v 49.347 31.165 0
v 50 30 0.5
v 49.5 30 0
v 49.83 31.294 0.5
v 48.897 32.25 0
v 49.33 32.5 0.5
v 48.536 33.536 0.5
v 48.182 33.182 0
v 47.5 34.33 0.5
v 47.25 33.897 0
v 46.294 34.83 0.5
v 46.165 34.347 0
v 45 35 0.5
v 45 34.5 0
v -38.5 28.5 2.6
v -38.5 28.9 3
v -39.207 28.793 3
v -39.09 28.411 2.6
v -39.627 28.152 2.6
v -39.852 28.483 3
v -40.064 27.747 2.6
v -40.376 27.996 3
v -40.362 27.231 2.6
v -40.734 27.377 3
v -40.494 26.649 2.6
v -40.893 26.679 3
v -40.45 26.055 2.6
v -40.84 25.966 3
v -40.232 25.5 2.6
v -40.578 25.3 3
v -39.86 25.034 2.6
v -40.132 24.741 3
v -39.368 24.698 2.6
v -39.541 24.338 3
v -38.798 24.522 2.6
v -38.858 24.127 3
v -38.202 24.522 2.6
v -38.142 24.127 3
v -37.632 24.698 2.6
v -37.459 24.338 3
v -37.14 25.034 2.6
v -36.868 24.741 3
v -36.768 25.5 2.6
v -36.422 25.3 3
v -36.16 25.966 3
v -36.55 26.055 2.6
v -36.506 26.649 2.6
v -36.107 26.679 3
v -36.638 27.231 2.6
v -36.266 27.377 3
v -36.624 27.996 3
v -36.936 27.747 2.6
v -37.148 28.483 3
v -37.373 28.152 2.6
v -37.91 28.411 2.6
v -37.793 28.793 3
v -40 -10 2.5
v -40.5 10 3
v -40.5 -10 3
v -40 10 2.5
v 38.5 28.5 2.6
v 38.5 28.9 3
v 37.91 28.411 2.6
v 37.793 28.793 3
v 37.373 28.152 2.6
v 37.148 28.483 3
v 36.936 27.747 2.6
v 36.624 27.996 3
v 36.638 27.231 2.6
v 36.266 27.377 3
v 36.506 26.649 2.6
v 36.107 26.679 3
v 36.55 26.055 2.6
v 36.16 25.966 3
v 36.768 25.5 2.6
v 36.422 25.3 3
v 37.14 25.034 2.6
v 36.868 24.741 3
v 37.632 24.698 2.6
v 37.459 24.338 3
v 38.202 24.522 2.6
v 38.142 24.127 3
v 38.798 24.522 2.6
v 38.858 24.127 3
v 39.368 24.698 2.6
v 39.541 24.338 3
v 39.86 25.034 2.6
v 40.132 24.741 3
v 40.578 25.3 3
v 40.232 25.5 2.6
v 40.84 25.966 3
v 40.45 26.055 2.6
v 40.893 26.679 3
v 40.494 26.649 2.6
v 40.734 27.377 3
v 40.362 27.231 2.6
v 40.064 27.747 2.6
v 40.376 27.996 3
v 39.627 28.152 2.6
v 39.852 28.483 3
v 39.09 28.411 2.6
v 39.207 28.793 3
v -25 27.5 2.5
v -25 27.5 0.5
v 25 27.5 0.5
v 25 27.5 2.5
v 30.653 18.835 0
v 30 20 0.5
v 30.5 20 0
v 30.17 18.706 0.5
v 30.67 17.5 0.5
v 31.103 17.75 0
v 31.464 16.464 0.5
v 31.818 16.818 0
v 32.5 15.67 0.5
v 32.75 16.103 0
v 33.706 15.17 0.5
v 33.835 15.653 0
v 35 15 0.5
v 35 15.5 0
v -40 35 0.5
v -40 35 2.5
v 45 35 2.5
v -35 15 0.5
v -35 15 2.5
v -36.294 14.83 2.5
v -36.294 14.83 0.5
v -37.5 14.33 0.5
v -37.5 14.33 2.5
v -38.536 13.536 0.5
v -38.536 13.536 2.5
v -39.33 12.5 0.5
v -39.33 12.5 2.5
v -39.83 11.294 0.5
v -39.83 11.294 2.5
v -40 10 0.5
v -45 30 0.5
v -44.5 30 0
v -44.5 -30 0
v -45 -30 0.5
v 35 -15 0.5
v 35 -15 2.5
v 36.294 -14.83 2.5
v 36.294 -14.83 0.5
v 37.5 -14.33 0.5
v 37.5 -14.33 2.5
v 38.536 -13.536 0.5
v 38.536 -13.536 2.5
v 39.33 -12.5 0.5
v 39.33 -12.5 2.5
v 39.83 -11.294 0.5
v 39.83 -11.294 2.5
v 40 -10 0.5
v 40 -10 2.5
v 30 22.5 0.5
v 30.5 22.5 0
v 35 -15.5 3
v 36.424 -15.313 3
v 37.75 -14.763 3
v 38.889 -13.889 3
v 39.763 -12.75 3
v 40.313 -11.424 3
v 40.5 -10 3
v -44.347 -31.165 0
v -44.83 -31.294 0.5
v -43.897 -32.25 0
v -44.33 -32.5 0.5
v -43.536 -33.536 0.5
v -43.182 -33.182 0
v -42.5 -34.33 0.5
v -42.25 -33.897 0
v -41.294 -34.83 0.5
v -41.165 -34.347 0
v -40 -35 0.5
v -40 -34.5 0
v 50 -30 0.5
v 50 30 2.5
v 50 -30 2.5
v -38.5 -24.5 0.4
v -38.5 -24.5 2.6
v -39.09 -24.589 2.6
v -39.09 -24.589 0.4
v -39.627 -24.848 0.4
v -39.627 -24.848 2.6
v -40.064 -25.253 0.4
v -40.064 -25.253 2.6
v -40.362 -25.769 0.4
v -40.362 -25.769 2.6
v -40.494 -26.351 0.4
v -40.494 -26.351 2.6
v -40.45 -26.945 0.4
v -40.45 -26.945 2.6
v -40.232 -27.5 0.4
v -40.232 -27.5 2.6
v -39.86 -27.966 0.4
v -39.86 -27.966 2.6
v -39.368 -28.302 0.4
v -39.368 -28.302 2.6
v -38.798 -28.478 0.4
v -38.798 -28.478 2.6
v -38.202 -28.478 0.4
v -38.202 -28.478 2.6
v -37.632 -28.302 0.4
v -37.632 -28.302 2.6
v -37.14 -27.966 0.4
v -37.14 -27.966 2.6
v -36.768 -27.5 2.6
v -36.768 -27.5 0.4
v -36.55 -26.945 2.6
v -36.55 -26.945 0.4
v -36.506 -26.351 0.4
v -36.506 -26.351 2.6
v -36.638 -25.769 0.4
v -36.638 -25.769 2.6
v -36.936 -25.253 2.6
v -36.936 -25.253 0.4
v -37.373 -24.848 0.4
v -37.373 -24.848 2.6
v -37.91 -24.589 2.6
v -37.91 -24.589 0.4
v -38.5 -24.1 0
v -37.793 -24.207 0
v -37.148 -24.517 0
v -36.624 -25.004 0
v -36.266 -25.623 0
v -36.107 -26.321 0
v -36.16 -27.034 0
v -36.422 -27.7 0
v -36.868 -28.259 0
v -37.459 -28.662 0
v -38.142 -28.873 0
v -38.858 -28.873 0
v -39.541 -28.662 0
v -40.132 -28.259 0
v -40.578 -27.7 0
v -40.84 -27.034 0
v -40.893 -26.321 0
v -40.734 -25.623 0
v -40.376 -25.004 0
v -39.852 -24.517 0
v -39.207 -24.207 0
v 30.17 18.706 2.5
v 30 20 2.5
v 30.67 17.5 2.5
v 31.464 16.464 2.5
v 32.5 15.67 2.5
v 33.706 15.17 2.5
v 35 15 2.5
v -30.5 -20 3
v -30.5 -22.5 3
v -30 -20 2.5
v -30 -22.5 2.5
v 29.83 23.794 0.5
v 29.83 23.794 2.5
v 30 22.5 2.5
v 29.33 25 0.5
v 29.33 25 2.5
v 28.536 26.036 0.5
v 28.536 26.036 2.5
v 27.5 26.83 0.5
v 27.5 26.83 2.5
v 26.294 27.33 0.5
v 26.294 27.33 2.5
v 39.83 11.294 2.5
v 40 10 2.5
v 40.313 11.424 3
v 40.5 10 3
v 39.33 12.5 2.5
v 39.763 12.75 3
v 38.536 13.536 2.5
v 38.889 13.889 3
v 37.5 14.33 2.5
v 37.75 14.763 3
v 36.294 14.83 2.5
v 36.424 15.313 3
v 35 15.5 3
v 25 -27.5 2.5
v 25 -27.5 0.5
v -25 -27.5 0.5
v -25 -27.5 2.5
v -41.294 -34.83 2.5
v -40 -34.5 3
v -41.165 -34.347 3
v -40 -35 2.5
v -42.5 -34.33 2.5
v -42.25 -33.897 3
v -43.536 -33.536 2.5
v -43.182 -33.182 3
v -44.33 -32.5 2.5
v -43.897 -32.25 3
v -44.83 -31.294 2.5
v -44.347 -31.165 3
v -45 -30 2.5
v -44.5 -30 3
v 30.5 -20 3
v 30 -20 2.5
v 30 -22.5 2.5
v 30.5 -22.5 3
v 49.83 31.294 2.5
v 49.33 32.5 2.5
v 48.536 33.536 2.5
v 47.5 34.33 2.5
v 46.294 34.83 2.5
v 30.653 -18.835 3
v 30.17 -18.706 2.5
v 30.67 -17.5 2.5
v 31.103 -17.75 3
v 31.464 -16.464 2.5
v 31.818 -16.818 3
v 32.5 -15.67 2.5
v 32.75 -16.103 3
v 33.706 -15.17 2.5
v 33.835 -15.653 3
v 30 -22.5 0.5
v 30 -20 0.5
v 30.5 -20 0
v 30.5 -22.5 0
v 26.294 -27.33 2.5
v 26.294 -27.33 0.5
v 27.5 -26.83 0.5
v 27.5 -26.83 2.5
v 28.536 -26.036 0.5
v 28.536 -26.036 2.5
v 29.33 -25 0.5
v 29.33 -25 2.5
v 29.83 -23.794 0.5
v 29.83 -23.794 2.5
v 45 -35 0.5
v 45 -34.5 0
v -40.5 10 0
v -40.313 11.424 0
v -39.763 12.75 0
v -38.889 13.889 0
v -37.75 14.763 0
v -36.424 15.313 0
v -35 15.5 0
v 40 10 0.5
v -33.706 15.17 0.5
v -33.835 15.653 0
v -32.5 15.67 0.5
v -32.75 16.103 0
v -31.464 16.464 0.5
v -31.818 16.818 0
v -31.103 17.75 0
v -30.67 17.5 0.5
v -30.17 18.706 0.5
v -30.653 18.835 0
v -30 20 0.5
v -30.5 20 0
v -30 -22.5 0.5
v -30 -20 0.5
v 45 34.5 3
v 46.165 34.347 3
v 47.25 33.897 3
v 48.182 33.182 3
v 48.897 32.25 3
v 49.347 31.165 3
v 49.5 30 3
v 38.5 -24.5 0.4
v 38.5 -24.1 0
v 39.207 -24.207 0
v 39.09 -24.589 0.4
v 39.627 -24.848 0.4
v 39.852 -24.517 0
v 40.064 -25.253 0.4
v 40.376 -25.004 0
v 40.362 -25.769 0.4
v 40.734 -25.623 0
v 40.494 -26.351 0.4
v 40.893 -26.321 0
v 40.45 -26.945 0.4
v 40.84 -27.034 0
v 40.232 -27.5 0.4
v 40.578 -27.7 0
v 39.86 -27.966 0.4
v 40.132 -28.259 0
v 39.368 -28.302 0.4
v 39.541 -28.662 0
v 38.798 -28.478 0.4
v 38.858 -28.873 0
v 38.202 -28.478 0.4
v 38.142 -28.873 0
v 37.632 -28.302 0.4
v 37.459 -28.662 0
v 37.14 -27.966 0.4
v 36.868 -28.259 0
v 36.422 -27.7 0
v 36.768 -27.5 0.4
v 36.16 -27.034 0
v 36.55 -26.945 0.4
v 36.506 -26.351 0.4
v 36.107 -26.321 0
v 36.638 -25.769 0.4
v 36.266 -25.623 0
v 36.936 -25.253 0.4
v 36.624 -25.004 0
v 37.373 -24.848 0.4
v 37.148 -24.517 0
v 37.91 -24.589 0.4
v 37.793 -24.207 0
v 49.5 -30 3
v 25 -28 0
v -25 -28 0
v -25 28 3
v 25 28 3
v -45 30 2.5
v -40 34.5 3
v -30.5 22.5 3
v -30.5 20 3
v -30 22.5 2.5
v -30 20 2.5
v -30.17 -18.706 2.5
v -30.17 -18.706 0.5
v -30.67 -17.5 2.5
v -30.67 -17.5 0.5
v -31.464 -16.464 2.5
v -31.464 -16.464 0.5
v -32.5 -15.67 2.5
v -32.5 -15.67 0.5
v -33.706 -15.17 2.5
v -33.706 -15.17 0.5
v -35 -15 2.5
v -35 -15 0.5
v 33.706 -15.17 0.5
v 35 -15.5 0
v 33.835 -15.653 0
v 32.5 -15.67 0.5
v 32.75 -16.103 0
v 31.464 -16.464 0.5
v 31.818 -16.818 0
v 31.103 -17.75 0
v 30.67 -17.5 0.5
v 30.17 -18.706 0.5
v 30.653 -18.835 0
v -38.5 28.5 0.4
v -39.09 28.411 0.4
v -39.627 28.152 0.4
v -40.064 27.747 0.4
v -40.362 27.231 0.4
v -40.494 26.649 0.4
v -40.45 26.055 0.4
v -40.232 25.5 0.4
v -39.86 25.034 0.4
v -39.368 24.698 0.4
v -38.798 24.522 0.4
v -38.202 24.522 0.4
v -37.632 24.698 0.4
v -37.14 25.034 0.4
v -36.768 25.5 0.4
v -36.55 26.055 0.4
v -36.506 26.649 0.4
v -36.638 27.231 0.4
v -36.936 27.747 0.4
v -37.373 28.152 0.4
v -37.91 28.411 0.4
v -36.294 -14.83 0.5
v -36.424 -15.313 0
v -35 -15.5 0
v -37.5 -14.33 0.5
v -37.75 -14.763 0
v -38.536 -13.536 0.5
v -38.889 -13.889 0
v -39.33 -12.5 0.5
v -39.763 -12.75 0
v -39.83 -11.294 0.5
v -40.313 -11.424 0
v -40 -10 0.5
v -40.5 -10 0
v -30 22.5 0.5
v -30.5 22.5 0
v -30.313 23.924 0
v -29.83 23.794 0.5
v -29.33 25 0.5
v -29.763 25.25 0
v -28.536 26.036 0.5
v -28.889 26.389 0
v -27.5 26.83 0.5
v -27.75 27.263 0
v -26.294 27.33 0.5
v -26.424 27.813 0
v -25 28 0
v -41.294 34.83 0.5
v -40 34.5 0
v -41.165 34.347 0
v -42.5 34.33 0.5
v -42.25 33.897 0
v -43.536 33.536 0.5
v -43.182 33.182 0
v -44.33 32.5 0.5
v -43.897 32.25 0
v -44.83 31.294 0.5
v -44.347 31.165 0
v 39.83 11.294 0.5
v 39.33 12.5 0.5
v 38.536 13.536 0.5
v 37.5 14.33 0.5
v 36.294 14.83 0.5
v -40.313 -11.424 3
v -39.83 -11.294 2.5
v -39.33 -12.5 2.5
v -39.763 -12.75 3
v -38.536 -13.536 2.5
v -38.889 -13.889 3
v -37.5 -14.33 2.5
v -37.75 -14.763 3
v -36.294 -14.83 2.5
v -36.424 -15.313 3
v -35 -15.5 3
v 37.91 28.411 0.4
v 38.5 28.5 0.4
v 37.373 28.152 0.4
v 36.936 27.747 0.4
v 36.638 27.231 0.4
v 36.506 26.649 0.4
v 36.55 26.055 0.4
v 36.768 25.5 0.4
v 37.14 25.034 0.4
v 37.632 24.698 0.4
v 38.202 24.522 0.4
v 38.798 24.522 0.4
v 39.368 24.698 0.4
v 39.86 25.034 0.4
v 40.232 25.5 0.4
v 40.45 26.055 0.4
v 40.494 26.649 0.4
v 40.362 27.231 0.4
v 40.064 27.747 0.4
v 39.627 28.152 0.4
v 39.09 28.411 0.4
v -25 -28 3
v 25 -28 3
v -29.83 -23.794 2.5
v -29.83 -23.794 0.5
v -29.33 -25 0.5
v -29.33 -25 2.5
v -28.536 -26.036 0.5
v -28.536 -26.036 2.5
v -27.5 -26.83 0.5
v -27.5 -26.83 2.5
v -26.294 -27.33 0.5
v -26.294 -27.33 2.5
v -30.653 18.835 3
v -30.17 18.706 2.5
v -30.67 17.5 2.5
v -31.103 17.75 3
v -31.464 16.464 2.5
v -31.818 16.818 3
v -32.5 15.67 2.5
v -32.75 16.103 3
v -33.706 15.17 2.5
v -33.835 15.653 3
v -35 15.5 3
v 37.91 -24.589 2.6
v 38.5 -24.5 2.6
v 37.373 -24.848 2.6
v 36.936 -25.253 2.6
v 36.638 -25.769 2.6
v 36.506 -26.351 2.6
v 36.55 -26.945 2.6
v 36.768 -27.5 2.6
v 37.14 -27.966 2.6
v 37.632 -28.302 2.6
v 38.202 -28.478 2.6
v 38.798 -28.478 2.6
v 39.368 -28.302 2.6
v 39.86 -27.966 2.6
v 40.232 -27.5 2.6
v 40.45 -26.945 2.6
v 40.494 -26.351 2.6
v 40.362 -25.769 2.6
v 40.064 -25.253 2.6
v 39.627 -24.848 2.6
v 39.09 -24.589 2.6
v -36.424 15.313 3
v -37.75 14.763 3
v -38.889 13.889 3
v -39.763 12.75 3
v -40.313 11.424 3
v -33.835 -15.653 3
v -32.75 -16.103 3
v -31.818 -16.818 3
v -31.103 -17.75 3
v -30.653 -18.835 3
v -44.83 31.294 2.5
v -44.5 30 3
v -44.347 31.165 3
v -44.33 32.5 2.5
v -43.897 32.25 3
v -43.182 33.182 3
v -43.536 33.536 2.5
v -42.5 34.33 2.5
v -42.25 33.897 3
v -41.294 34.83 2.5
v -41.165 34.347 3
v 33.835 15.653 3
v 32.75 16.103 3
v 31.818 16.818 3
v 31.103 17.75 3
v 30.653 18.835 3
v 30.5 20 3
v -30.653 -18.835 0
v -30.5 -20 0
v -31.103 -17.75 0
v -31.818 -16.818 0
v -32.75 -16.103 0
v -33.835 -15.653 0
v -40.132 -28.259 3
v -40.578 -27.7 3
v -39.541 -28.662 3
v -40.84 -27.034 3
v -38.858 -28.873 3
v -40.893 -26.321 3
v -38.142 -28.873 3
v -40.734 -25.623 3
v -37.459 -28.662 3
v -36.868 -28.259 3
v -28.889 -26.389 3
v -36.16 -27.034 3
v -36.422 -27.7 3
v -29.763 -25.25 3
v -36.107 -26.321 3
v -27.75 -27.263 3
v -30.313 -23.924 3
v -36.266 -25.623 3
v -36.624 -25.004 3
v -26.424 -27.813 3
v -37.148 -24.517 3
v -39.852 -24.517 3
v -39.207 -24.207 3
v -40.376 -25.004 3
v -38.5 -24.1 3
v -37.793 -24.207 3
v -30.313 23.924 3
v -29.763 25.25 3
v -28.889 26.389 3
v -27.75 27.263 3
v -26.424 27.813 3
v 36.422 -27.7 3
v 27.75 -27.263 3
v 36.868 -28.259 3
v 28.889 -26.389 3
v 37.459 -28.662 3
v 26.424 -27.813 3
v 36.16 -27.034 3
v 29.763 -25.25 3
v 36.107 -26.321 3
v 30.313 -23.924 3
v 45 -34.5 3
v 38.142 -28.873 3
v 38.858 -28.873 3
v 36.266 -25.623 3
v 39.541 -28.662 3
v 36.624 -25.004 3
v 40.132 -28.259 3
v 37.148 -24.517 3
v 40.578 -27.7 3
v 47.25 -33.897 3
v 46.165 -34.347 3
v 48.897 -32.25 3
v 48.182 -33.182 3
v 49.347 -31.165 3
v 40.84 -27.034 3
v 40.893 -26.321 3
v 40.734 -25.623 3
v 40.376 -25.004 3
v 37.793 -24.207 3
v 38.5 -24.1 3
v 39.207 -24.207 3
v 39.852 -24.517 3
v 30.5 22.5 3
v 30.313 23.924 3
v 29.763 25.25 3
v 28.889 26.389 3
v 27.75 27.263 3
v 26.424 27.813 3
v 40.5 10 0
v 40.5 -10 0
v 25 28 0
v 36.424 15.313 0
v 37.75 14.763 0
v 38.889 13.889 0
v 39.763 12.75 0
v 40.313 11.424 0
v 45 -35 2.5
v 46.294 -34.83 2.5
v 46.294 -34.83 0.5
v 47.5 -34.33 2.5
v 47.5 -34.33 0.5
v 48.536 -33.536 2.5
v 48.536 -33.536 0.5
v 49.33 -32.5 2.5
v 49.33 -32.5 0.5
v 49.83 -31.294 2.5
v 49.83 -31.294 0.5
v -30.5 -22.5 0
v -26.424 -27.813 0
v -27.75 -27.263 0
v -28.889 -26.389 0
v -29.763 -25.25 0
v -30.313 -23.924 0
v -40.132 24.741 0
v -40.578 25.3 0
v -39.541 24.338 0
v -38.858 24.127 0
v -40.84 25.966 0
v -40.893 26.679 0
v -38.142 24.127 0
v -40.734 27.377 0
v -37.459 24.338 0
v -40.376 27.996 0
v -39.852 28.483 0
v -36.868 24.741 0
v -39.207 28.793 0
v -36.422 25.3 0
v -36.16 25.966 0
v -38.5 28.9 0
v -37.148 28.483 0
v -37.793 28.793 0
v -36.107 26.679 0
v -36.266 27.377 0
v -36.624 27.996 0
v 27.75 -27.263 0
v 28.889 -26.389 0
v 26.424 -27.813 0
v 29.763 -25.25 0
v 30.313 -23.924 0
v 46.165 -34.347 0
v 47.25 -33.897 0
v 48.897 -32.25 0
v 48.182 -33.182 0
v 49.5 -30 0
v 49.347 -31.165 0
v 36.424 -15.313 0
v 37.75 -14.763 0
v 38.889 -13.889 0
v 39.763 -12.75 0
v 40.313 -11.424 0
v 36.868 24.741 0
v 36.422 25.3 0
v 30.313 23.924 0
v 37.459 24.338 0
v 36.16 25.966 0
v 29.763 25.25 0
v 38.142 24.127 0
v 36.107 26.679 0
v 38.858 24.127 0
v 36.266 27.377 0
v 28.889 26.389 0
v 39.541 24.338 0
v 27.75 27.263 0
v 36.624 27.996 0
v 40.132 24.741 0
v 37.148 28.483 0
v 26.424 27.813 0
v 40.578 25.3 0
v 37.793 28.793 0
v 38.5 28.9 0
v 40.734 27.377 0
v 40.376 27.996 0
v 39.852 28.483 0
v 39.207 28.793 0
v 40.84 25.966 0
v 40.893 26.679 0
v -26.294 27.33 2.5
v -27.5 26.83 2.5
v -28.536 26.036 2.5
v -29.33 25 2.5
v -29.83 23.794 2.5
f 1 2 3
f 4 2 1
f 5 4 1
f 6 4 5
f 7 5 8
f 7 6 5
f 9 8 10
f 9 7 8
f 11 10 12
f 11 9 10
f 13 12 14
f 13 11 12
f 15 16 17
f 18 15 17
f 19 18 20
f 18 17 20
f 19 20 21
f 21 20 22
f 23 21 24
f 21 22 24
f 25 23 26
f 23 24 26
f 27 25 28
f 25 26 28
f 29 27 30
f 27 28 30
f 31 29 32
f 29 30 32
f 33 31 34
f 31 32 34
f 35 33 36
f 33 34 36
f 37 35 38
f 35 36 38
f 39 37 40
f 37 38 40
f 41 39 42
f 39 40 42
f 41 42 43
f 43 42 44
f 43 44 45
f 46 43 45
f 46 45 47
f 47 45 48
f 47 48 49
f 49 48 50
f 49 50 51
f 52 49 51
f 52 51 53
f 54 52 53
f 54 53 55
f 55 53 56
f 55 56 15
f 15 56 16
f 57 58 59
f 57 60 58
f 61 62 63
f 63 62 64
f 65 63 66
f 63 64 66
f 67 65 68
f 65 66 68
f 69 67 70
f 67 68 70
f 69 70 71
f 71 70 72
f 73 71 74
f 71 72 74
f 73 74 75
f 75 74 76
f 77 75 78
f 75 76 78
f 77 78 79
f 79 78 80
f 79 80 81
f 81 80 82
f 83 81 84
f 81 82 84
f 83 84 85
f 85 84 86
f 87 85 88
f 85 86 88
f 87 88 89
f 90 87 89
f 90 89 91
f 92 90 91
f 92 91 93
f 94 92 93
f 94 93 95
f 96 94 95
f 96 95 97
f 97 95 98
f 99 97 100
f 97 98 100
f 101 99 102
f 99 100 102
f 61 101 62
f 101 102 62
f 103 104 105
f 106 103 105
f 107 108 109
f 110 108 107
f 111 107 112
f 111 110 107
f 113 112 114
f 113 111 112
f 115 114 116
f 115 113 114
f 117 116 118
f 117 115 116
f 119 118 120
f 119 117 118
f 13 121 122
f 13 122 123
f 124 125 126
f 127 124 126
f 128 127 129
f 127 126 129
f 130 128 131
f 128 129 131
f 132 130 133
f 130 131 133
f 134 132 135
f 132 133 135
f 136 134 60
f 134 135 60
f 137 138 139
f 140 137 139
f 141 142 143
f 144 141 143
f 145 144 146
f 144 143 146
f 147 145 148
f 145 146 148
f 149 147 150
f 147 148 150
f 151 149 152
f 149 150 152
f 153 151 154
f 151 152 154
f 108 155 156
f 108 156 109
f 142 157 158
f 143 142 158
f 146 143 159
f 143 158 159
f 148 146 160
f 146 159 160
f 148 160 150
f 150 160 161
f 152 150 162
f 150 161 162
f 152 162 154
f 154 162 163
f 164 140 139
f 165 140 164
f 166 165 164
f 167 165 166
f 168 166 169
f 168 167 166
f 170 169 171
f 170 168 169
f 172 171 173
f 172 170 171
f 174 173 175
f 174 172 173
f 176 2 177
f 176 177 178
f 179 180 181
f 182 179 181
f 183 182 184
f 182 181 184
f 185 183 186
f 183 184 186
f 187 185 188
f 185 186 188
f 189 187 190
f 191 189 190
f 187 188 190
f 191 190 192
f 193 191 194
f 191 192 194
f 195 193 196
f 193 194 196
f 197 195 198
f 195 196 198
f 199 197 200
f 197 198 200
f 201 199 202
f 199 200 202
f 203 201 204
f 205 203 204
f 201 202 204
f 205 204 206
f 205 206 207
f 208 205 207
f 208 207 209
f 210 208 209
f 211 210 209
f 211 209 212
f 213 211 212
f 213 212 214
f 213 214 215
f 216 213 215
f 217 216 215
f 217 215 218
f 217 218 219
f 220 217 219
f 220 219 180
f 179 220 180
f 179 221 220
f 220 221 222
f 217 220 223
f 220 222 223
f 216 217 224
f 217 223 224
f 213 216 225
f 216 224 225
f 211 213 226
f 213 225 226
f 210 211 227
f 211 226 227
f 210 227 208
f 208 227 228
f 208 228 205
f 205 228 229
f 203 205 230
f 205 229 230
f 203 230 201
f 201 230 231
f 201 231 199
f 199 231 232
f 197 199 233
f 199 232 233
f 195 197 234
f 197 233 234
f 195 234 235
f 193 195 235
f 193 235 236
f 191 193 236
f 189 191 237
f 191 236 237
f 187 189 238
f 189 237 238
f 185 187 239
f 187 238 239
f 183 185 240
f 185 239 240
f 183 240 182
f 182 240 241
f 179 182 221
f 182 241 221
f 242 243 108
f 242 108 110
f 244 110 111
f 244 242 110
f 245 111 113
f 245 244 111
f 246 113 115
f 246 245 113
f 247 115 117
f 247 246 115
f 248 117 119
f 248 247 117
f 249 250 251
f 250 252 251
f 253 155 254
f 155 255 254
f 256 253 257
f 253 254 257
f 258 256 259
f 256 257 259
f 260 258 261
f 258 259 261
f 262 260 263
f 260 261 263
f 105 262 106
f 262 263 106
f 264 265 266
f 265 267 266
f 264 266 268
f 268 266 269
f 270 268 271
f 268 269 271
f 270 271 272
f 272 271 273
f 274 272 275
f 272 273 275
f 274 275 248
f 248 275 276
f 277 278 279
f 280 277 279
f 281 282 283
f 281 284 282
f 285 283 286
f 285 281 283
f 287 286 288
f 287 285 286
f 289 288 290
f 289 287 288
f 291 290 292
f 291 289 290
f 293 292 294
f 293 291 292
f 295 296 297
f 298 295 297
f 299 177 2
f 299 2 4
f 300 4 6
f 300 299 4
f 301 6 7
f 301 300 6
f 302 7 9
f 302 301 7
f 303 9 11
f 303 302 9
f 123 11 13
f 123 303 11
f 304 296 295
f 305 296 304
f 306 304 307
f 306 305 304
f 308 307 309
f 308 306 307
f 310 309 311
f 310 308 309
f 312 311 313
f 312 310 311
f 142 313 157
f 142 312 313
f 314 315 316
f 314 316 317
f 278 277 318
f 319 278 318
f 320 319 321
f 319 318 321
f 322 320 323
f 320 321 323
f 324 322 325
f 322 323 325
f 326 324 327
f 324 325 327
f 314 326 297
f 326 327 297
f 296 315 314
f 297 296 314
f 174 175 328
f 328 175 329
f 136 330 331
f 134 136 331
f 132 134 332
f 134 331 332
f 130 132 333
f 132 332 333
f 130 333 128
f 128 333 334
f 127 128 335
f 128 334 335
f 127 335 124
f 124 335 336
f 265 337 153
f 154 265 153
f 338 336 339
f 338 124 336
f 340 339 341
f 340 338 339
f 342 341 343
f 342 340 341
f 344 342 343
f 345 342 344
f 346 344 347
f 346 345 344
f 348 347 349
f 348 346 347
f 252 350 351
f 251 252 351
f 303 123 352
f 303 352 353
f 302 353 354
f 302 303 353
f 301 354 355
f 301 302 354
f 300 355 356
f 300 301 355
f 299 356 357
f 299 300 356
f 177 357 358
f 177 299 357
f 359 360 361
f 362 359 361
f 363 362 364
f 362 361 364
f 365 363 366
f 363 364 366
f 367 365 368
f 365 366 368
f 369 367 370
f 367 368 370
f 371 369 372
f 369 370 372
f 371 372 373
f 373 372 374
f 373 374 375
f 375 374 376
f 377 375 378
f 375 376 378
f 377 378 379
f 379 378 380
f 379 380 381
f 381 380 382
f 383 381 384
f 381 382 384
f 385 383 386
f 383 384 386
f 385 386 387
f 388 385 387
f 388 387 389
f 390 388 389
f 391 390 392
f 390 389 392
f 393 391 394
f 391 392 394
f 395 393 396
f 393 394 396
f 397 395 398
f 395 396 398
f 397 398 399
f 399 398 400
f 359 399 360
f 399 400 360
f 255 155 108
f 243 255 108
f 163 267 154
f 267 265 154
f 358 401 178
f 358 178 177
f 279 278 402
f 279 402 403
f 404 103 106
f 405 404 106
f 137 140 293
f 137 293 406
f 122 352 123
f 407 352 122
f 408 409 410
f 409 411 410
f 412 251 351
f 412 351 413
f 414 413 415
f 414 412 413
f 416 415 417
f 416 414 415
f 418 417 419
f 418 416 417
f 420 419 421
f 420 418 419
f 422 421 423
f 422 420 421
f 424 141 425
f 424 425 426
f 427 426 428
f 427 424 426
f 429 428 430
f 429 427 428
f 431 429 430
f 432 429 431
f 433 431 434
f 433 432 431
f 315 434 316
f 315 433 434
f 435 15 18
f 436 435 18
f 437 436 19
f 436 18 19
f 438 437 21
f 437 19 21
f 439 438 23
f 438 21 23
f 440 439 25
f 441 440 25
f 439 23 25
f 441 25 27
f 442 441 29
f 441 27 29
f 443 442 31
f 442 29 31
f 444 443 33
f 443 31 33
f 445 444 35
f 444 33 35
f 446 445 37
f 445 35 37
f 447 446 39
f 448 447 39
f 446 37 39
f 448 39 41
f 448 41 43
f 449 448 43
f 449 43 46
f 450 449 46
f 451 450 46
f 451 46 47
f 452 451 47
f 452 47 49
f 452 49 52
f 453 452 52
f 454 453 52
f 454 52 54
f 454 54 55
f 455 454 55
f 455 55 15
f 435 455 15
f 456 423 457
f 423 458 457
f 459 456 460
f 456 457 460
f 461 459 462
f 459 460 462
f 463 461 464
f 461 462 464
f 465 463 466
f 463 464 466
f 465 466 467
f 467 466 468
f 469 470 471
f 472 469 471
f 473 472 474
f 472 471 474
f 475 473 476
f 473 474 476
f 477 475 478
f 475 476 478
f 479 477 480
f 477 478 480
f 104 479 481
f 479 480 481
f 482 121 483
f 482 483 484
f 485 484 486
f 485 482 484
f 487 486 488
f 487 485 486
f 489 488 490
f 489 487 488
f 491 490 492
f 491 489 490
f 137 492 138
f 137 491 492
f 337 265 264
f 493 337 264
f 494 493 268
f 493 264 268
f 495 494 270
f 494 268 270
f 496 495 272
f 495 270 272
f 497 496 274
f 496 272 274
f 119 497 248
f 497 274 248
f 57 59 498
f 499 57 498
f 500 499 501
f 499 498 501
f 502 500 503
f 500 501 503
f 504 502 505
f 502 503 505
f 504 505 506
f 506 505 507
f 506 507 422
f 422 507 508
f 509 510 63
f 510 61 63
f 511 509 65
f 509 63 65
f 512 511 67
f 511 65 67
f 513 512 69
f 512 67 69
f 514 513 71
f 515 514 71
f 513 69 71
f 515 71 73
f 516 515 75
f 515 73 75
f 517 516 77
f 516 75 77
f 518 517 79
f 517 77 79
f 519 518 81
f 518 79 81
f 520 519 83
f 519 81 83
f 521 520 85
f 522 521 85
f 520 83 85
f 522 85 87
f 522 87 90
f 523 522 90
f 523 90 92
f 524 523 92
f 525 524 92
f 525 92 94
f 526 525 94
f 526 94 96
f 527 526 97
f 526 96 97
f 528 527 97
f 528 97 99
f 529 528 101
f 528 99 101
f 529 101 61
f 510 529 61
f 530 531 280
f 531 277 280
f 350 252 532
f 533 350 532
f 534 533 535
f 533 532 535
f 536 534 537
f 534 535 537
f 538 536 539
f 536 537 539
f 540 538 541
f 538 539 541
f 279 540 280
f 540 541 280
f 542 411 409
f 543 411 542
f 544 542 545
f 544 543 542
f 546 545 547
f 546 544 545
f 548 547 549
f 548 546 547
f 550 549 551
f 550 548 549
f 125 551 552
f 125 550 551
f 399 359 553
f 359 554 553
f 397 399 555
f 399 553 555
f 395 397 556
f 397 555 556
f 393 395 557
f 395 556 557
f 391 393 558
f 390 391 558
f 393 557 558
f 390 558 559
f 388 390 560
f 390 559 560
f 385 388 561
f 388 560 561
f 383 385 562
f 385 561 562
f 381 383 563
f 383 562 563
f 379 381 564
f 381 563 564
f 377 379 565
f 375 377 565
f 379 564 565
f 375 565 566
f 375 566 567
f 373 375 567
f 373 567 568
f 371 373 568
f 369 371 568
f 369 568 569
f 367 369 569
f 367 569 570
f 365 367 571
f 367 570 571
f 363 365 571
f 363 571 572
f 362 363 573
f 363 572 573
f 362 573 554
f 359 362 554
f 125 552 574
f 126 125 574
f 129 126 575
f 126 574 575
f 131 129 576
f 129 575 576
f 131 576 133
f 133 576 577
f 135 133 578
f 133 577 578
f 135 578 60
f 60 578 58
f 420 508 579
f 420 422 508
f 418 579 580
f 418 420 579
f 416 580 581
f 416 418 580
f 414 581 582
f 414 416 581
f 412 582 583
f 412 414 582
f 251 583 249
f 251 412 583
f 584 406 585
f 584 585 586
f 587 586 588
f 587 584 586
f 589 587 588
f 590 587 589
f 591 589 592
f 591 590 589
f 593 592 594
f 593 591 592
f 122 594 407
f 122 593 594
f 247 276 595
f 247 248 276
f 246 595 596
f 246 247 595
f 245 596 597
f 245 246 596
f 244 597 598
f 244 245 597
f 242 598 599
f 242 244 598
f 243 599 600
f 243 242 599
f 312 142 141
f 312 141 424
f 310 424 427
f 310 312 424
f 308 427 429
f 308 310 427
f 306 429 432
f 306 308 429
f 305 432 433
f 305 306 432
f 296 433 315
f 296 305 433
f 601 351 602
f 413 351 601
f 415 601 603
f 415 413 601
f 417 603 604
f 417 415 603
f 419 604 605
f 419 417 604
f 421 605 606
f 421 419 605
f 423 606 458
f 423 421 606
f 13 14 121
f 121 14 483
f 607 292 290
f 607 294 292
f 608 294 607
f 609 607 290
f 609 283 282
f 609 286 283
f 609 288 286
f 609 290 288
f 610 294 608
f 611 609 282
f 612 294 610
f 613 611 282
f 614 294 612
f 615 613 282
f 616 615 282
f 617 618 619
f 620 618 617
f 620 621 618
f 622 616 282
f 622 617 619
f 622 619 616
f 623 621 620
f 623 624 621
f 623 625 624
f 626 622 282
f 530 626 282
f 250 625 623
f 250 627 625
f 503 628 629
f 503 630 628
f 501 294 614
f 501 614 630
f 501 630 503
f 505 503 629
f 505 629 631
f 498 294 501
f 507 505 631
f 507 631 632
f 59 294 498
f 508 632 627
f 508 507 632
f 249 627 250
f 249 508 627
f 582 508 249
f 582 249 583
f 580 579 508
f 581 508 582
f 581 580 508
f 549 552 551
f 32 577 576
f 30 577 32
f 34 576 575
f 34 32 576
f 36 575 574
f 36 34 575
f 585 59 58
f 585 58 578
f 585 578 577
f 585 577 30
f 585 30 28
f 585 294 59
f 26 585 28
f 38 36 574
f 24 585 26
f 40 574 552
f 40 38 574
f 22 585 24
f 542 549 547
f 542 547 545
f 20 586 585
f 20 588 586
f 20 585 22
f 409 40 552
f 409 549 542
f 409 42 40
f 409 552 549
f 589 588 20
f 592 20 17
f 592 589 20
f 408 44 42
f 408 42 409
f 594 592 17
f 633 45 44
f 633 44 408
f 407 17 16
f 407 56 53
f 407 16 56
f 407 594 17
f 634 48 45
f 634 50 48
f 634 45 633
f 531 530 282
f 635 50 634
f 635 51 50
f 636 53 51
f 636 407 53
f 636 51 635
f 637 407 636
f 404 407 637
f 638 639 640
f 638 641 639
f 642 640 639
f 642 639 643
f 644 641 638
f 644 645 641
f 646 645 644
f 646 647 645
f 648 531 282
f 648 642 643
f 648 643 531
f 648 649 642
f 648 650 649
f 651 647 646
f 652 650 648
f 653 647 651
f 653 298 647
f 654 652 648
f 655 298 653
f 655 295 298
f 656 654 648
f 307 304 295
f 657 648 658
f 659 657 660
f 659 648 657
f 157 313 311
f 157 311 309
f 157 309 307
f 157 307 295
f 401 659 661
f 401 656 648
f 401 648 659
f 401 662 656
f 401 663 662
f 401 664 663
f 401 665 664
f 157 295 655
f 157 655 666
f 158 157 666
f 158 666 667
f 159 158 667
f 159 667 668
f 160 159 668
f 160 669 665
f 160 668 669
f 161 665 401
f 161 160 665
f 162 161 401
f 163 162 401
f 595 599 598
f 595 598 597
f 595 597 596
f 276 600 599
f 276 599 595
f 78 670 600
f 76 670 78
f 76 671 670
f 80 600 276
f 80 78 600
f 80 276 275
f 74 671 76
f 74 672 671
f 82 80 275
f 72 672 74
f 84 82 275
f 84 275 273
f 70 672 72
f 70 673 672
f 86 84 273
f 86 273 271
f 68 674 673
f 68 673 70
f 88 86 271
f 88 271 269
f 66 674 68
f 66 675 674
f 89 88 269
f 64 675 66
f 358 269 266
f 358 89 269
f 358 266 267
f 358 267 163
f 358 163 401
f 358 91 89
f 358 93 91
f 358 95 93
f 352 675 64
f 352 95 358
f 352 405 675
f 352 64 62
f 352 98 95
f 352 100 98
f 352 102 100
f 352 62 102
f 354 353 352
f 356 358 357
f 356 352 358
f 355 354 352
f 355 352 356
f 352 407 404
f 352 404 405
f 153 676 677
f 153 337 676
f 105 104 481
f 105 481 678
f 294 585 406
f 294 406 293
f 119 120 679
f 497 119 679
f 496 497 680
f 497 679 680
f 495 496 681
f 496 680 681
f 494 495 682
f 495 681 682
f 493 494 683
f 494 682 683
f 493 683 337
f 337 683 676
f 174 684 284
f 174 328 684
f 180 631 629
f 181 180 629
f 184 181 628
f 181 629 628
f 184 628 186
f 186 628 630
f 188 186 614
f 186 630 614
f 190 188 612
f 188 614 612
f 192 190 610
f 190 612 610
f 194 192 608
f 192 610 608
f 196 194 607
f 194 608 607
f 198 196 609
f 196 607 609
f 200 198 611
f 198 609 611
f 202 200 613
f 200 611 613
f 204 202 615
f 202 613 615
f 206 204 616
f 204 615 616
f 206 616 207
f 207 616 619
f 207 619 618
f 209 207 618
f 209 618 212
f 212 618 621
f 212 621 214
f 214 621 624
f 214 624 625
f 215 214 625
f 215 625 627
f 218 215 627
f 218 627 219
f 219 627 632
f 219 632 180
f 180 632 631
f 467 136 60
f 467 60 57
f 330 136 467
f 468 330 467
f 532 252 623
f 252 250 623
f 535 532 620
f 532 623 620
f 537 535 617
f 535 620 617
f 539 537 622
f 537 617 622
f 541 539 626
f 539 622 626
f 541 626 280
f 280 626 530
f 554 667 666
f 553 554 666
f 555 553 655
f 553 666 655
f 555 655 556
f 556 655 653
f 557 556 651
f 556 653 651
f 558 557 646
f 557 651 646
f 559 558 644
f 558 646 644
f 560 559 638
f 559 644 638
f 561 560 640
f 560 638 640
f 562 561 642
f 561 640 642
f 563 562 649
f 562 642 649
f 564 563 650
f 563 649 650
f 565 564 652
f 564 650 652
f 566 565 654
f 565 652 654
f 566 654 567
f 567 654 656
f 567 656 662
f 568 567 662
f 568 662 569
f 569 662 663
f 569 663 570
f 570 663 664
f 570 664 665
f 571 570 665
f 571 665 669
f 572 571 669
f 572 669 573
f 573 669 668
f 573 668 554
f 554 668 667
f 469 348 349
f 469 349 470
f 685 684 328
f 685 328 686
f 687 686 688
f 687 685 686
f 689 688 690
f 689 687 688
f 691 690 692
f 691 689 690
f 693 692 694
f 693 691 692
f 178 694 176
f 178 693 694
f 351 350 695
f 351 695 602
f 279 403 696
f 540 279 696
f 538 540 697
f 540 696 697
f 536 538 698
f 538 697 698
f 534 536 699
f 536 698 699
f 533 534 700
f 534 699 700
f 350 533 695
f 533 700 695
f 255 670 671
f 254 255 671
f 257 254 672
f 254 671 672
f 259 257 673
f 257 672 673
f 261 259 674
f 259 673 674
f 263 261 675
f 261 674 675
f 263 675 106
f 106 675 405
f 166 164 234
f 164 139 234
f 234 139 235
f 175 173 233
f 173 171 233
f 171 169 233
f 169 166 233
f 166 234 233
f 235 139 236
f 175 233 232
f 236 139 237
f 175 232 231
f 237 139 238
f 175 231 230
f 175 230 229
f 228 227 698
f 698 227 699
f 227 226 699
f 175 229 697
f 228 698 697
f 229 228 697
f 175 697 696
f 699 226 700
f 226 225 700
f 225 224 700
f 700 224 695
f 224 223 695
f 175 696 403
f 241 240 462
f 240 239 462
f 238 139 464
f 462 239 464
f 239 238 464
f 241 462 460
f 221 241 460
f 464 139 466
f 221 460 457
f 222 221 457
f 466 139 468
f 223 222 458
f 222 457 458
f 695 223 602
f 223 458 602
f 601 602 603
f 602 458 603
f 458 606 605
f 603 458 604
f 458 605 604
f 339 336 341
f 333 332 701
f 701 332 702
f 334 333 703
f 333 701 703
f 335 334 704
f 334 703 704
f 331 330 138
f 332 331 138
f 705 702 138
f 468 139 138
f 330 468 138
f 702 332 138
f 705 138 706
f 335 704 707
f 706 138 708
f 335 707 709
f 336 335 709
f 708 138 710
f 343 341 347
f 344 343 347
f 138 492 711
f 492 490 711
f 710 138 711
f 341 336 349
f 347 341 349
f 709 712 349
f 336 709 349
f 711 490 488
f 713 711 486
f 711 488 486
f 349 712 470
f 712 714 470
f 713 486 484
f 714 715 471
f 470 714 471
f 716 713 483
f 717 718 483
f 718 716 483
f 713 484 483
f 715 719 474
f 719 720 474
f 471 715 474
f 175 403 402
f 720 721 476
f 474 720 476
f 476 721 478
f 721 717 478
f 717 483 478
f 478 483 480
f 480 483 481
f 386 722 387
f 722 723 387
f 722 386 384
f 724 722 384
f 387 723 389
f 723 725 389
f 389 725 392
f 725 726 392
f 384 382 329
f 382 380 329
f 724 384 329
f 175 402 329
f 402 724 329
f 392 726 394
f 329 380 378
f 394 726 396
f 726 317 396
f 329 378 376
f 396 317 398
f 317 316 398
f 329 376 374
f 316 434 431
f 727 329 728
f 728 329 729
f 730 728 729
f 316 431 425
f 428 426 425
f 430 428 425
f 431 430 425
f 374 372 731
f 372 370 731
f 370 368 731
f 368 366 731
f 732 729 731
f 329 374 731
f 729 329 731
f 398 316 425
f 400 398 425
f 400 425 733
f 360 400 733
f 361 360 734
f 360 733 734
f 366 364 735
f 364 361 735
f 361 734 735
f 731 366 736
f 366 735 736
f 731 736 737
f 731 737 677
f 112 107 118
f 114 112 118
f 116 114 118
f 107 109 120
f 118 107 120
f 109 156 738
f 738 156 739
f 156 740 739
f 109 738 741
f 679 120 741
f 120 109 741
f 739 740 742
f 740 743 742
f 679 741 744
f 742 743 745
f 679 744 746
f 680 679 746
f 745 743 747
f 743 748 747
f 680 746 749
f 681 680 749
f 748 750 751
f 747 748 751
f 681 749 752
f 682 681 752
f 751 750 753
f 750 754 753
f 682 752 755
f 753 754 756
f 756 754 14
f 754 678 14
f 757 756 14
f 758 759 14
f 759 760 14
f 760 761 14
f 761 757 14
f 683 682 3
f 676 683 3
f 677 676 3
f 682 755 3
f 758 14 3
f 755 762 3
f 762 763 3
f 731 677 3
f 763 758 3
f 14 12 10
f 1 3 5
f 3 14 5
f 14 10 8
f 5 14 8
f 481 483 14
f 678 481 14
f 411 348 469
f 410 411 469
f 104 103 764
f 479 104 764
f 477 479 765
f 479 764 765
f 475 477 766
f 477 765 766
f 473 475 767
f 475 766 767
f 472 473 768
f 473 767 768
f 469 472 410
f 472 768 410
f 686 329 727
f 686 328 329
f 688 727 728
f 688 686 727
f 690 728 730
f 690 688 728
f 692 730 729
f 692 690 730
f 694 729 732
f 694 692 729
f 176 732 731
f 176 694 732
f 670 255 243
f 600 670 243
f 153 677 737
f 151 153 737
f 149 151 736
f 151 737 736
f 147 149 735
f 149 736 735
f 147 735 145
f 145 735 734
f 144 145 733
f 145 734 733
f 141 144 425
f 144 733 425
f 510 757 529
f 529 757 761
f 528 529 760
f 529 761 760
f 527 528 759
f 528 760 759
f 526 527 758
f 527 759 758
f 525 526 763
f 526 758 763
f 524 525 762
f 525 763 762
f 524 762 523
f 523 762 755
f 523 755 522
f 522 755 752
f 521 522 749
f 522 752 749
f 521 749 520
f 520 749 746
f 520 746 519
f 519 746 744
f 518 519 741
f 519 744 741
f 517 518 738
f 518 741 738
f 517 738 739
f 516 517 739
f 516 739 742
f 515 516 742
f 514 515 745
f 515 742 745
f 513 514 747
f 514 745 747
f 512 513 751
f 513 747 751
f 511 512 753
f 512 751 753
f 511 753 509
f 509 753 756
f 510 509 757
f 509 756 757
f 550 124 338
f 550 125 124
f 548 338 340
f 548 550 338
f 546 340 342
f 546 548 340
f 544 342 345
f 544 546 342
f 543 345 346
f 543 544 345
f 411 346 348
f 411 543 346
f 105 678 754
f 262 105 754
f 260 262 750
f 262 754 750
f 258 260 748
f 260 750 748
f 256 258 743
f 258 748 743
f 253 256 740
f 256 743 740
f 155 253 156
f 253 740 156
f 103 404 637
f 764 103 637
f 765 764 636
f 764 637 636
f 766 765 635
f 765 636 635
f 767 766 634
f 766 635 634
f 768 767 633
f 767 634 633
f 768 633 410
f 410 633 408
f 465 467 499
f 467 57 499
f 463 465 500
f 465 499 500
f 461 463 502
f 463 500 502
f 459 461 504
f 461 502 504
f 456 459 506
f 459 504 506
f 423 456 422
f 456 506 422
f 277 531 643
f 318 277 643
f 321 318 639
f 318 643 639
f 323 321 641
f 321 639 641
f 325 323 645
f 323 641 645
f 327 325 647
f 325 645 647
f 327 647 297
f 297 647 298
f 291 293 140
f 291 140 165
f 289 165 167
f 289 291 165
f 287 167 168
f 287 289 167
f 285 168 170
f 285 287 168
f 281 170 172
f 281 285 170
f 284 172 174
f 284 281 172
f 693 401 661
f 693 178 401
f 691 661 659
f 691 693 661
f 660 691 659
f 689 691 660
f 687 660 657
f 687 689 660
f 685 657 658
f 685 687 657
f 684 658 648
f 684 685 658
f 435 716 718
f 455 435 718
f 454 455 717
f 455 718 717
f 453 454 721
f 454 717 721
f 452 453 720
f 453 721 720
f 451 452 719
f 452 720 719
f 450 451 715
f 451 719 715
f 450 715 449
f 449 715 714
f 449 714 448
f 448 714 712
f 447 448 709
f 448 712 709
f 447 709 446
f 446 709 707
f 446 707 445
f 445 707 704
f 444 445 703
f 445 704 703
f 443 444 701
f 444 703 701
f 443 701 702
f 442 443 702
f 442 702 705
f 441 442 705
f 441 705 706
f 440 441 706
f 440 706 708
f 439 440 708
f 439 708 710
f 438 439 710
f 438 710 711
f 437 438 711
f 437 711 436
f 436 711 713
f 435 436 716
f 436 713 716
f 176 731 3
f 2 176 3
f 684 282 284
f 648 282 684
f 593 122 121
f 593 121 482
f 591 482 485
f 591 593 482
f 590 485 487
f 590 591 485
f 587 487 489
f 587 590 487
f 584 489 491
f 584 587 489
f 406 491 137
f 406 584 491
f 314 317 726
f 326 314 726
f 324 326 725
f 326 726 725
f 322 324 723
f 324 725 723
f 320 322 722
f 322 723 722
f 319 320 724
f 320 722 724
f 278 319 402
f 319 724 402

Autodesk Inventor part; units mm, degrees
ref_plane "YZ Plane" through (0, 0, 0) normal (1, 0, 0) x (0, 1, 0)
ref_plane "XZ Plane" through (0, 0, 0) normal (0, 1, 0) x (-1, 0, 0)
ref_plane "XY Plane" through (0, 0, 0) normal (0, 0, 1) x (1, 0, 0)
sketch "Sketch1" plane through (0, 0, 0) normal (0, 0, 1) x (1, 0, 0)
  line L0 (-45, 35) -> (50, 35)
  line L1 (50, 35) -> (50, -35)
  line L2 (50, -35) -> (-45, -35)
  line L3 (-45, -35) -> (-45, 35)
  line L4 (-38.5, 26.5) -> (38.5, 26.5) construction
  line L5 (38.5, 26.5) -> (38.5, -26.5) construction
  line L6 (38.5, -26.5) -> (-38.5, -26.5) construction
  line L7 (-38.5, -26.5) -> (-38.5, 26.5) construction
  circle A0 centre (-38.5, 26.5) radius 2.5
  circle A1 centre (38.5, 26.5) radius 2.5
  circle A2 centre (38.5, -26.5) radius 2.5
  circle A3 centre (-38.5, -26.5) radius 2.5
  line L8 (-30, 27.5) -> (30, 27.5)
  line L9 (30, 27.5) -> (30, -27.5)
  line L10 (30, -27.5) -> (-30, -27.5)
  line L11 (-30, -27.5) -> (-30, 27.5)
  line L12 (30, 15) -> (40, 15)
  line L13 (40, 15) -> (40, -15)
  line L14 (40, -15) -> (30, -15)
  line L15 (30, -15) -> (30, 15)
  line L16 (-30, 15) -> (-40, 15)
  line L17 (-40, 15) -> (-40, -15)
  line L18 (-40, -15) -> (-30, -15)
  line L19 (-30, -15) -> (-30, 15)
  point P0 (0, 0)
  point P1 (50, 0)
  point P2 (2.5, 35)
  point P3 (38.5, 0)
  point P4 (0, 26.5)
  point P5 (30, 0)
  point P6 (0, 27.5)
  point P7 (-40, 0)
  point P8 (40, 0)
  dimension "d1" = 70
  dimension "d2" = 77
  dimension "d3" = 53
  dimension "d14" = 5
  dimension "d23" = 45
  dimension "d24" = 50
  dimension "d25" = 55
  dimension "d26" = 60
  dimension "d27" = 30
  dimension "d28" = 10
  dimension "d29" = 10
extrude "Extrusion1" add sketch "Sketch1" along normal blind 3 contours L0 L1 L2 L3 | A0 | A1 | A2 | A3
hole "Hole1" at (38.5, 26.5, 0) at (38.5, -26.5, 0) at (-38.5, -26.5, 0) at (-38.5, 26.5, 0) direction (0, 0, 1) diameter 4 end through all
fillet "Fillet1" radius 5 16 edges at (50, 35, 1.5) (50, -35, 1.5) (-45, -35, 1.5) (-45, 35, 1.5) (-30, 27.5, 1.5) (30, 27.5, 1.5) (30, -27.5, 1.5) (-30, -27.5, 1.5) (-30, 15, 1.5) (-40, 15, 1.5) (-40, -15, 1.5) (-30, -15, 1.5) (30, 15, 1.5) (40, 15, 1.5) (40, -15, 1.5) (30, -15, 1.5)
chamfer "Chamfer2" distance 0.5 angle 45 44 edges at (2.5, 35, 0) (-43.5357, 33.5357, 0) (-45, 0, 0) (-43.5357, -33.5357, 0) (2.5, -35, 0) (48.5357, -33.5357, 0) (50, 0, 0) (48.5357, 33.5357, 0) (2.5, 35, 3) (-43.5357, 33.5357, 3) (-45, 0, 3) (-43.5357, -33.5357, 3) (2.5, -35, 3) (48.5357, -33.5357, 3) (50, 0, 3) (48.5357, 33.5357, 3) (0, 27.5, 3) (31.4643, 16.4643, 3) (35, 15, 3) (40, 0, 3) (35, -15, 3) (31.4643, -16.4643, 3) (0, -27.5, 3) (-30, -21.25, 3) (-31.4643, -16.4643, 3) (-35, -15, 3) (-40, 0, 3) (-35, 15, 3) (-31.4643, 16.4643, 3) (-30, 21.25, 3) (0, 27.5, 0) (31.4643, 16.4643, 0) (35, 15, 0) (40, 0, 0) (35, -15, 0) (31.4643, -16.4643, 0) (0, -27.5, 0) (-30, -21.25, 0) (-31.4643, -16.4643, 0) (-35, -15, 0) (-40, 0, 0) (-35, 15, 0) (-31.4643, 16.4643, 0) (-30, 21.25, 0)
chamfer "Chamfer3" distance 0.4 angle 45 8 edges at (-38.5, -28.5, 3) (38.5, -28.5, 3) (-38.5, 24.5, 3) (38.5, 24.5, 3) (-38.5, -28.5, 0) (38.5, -28.5, 0) (-38.5, 24.5, 0) (38.5, 24.5, 0)
equation "\"d1\" = width"
equation "\"d23\" = 0.5 * length"
equation "\"d4\" = thickness"
equation "\"width\" = 70"
equation "\"thickness\" = 3"
equation "\"bump\" = 3"
equation "\"length\" = 90"
properties part number "temp-logger-base-plate-v2" material "ABS Plastic"
